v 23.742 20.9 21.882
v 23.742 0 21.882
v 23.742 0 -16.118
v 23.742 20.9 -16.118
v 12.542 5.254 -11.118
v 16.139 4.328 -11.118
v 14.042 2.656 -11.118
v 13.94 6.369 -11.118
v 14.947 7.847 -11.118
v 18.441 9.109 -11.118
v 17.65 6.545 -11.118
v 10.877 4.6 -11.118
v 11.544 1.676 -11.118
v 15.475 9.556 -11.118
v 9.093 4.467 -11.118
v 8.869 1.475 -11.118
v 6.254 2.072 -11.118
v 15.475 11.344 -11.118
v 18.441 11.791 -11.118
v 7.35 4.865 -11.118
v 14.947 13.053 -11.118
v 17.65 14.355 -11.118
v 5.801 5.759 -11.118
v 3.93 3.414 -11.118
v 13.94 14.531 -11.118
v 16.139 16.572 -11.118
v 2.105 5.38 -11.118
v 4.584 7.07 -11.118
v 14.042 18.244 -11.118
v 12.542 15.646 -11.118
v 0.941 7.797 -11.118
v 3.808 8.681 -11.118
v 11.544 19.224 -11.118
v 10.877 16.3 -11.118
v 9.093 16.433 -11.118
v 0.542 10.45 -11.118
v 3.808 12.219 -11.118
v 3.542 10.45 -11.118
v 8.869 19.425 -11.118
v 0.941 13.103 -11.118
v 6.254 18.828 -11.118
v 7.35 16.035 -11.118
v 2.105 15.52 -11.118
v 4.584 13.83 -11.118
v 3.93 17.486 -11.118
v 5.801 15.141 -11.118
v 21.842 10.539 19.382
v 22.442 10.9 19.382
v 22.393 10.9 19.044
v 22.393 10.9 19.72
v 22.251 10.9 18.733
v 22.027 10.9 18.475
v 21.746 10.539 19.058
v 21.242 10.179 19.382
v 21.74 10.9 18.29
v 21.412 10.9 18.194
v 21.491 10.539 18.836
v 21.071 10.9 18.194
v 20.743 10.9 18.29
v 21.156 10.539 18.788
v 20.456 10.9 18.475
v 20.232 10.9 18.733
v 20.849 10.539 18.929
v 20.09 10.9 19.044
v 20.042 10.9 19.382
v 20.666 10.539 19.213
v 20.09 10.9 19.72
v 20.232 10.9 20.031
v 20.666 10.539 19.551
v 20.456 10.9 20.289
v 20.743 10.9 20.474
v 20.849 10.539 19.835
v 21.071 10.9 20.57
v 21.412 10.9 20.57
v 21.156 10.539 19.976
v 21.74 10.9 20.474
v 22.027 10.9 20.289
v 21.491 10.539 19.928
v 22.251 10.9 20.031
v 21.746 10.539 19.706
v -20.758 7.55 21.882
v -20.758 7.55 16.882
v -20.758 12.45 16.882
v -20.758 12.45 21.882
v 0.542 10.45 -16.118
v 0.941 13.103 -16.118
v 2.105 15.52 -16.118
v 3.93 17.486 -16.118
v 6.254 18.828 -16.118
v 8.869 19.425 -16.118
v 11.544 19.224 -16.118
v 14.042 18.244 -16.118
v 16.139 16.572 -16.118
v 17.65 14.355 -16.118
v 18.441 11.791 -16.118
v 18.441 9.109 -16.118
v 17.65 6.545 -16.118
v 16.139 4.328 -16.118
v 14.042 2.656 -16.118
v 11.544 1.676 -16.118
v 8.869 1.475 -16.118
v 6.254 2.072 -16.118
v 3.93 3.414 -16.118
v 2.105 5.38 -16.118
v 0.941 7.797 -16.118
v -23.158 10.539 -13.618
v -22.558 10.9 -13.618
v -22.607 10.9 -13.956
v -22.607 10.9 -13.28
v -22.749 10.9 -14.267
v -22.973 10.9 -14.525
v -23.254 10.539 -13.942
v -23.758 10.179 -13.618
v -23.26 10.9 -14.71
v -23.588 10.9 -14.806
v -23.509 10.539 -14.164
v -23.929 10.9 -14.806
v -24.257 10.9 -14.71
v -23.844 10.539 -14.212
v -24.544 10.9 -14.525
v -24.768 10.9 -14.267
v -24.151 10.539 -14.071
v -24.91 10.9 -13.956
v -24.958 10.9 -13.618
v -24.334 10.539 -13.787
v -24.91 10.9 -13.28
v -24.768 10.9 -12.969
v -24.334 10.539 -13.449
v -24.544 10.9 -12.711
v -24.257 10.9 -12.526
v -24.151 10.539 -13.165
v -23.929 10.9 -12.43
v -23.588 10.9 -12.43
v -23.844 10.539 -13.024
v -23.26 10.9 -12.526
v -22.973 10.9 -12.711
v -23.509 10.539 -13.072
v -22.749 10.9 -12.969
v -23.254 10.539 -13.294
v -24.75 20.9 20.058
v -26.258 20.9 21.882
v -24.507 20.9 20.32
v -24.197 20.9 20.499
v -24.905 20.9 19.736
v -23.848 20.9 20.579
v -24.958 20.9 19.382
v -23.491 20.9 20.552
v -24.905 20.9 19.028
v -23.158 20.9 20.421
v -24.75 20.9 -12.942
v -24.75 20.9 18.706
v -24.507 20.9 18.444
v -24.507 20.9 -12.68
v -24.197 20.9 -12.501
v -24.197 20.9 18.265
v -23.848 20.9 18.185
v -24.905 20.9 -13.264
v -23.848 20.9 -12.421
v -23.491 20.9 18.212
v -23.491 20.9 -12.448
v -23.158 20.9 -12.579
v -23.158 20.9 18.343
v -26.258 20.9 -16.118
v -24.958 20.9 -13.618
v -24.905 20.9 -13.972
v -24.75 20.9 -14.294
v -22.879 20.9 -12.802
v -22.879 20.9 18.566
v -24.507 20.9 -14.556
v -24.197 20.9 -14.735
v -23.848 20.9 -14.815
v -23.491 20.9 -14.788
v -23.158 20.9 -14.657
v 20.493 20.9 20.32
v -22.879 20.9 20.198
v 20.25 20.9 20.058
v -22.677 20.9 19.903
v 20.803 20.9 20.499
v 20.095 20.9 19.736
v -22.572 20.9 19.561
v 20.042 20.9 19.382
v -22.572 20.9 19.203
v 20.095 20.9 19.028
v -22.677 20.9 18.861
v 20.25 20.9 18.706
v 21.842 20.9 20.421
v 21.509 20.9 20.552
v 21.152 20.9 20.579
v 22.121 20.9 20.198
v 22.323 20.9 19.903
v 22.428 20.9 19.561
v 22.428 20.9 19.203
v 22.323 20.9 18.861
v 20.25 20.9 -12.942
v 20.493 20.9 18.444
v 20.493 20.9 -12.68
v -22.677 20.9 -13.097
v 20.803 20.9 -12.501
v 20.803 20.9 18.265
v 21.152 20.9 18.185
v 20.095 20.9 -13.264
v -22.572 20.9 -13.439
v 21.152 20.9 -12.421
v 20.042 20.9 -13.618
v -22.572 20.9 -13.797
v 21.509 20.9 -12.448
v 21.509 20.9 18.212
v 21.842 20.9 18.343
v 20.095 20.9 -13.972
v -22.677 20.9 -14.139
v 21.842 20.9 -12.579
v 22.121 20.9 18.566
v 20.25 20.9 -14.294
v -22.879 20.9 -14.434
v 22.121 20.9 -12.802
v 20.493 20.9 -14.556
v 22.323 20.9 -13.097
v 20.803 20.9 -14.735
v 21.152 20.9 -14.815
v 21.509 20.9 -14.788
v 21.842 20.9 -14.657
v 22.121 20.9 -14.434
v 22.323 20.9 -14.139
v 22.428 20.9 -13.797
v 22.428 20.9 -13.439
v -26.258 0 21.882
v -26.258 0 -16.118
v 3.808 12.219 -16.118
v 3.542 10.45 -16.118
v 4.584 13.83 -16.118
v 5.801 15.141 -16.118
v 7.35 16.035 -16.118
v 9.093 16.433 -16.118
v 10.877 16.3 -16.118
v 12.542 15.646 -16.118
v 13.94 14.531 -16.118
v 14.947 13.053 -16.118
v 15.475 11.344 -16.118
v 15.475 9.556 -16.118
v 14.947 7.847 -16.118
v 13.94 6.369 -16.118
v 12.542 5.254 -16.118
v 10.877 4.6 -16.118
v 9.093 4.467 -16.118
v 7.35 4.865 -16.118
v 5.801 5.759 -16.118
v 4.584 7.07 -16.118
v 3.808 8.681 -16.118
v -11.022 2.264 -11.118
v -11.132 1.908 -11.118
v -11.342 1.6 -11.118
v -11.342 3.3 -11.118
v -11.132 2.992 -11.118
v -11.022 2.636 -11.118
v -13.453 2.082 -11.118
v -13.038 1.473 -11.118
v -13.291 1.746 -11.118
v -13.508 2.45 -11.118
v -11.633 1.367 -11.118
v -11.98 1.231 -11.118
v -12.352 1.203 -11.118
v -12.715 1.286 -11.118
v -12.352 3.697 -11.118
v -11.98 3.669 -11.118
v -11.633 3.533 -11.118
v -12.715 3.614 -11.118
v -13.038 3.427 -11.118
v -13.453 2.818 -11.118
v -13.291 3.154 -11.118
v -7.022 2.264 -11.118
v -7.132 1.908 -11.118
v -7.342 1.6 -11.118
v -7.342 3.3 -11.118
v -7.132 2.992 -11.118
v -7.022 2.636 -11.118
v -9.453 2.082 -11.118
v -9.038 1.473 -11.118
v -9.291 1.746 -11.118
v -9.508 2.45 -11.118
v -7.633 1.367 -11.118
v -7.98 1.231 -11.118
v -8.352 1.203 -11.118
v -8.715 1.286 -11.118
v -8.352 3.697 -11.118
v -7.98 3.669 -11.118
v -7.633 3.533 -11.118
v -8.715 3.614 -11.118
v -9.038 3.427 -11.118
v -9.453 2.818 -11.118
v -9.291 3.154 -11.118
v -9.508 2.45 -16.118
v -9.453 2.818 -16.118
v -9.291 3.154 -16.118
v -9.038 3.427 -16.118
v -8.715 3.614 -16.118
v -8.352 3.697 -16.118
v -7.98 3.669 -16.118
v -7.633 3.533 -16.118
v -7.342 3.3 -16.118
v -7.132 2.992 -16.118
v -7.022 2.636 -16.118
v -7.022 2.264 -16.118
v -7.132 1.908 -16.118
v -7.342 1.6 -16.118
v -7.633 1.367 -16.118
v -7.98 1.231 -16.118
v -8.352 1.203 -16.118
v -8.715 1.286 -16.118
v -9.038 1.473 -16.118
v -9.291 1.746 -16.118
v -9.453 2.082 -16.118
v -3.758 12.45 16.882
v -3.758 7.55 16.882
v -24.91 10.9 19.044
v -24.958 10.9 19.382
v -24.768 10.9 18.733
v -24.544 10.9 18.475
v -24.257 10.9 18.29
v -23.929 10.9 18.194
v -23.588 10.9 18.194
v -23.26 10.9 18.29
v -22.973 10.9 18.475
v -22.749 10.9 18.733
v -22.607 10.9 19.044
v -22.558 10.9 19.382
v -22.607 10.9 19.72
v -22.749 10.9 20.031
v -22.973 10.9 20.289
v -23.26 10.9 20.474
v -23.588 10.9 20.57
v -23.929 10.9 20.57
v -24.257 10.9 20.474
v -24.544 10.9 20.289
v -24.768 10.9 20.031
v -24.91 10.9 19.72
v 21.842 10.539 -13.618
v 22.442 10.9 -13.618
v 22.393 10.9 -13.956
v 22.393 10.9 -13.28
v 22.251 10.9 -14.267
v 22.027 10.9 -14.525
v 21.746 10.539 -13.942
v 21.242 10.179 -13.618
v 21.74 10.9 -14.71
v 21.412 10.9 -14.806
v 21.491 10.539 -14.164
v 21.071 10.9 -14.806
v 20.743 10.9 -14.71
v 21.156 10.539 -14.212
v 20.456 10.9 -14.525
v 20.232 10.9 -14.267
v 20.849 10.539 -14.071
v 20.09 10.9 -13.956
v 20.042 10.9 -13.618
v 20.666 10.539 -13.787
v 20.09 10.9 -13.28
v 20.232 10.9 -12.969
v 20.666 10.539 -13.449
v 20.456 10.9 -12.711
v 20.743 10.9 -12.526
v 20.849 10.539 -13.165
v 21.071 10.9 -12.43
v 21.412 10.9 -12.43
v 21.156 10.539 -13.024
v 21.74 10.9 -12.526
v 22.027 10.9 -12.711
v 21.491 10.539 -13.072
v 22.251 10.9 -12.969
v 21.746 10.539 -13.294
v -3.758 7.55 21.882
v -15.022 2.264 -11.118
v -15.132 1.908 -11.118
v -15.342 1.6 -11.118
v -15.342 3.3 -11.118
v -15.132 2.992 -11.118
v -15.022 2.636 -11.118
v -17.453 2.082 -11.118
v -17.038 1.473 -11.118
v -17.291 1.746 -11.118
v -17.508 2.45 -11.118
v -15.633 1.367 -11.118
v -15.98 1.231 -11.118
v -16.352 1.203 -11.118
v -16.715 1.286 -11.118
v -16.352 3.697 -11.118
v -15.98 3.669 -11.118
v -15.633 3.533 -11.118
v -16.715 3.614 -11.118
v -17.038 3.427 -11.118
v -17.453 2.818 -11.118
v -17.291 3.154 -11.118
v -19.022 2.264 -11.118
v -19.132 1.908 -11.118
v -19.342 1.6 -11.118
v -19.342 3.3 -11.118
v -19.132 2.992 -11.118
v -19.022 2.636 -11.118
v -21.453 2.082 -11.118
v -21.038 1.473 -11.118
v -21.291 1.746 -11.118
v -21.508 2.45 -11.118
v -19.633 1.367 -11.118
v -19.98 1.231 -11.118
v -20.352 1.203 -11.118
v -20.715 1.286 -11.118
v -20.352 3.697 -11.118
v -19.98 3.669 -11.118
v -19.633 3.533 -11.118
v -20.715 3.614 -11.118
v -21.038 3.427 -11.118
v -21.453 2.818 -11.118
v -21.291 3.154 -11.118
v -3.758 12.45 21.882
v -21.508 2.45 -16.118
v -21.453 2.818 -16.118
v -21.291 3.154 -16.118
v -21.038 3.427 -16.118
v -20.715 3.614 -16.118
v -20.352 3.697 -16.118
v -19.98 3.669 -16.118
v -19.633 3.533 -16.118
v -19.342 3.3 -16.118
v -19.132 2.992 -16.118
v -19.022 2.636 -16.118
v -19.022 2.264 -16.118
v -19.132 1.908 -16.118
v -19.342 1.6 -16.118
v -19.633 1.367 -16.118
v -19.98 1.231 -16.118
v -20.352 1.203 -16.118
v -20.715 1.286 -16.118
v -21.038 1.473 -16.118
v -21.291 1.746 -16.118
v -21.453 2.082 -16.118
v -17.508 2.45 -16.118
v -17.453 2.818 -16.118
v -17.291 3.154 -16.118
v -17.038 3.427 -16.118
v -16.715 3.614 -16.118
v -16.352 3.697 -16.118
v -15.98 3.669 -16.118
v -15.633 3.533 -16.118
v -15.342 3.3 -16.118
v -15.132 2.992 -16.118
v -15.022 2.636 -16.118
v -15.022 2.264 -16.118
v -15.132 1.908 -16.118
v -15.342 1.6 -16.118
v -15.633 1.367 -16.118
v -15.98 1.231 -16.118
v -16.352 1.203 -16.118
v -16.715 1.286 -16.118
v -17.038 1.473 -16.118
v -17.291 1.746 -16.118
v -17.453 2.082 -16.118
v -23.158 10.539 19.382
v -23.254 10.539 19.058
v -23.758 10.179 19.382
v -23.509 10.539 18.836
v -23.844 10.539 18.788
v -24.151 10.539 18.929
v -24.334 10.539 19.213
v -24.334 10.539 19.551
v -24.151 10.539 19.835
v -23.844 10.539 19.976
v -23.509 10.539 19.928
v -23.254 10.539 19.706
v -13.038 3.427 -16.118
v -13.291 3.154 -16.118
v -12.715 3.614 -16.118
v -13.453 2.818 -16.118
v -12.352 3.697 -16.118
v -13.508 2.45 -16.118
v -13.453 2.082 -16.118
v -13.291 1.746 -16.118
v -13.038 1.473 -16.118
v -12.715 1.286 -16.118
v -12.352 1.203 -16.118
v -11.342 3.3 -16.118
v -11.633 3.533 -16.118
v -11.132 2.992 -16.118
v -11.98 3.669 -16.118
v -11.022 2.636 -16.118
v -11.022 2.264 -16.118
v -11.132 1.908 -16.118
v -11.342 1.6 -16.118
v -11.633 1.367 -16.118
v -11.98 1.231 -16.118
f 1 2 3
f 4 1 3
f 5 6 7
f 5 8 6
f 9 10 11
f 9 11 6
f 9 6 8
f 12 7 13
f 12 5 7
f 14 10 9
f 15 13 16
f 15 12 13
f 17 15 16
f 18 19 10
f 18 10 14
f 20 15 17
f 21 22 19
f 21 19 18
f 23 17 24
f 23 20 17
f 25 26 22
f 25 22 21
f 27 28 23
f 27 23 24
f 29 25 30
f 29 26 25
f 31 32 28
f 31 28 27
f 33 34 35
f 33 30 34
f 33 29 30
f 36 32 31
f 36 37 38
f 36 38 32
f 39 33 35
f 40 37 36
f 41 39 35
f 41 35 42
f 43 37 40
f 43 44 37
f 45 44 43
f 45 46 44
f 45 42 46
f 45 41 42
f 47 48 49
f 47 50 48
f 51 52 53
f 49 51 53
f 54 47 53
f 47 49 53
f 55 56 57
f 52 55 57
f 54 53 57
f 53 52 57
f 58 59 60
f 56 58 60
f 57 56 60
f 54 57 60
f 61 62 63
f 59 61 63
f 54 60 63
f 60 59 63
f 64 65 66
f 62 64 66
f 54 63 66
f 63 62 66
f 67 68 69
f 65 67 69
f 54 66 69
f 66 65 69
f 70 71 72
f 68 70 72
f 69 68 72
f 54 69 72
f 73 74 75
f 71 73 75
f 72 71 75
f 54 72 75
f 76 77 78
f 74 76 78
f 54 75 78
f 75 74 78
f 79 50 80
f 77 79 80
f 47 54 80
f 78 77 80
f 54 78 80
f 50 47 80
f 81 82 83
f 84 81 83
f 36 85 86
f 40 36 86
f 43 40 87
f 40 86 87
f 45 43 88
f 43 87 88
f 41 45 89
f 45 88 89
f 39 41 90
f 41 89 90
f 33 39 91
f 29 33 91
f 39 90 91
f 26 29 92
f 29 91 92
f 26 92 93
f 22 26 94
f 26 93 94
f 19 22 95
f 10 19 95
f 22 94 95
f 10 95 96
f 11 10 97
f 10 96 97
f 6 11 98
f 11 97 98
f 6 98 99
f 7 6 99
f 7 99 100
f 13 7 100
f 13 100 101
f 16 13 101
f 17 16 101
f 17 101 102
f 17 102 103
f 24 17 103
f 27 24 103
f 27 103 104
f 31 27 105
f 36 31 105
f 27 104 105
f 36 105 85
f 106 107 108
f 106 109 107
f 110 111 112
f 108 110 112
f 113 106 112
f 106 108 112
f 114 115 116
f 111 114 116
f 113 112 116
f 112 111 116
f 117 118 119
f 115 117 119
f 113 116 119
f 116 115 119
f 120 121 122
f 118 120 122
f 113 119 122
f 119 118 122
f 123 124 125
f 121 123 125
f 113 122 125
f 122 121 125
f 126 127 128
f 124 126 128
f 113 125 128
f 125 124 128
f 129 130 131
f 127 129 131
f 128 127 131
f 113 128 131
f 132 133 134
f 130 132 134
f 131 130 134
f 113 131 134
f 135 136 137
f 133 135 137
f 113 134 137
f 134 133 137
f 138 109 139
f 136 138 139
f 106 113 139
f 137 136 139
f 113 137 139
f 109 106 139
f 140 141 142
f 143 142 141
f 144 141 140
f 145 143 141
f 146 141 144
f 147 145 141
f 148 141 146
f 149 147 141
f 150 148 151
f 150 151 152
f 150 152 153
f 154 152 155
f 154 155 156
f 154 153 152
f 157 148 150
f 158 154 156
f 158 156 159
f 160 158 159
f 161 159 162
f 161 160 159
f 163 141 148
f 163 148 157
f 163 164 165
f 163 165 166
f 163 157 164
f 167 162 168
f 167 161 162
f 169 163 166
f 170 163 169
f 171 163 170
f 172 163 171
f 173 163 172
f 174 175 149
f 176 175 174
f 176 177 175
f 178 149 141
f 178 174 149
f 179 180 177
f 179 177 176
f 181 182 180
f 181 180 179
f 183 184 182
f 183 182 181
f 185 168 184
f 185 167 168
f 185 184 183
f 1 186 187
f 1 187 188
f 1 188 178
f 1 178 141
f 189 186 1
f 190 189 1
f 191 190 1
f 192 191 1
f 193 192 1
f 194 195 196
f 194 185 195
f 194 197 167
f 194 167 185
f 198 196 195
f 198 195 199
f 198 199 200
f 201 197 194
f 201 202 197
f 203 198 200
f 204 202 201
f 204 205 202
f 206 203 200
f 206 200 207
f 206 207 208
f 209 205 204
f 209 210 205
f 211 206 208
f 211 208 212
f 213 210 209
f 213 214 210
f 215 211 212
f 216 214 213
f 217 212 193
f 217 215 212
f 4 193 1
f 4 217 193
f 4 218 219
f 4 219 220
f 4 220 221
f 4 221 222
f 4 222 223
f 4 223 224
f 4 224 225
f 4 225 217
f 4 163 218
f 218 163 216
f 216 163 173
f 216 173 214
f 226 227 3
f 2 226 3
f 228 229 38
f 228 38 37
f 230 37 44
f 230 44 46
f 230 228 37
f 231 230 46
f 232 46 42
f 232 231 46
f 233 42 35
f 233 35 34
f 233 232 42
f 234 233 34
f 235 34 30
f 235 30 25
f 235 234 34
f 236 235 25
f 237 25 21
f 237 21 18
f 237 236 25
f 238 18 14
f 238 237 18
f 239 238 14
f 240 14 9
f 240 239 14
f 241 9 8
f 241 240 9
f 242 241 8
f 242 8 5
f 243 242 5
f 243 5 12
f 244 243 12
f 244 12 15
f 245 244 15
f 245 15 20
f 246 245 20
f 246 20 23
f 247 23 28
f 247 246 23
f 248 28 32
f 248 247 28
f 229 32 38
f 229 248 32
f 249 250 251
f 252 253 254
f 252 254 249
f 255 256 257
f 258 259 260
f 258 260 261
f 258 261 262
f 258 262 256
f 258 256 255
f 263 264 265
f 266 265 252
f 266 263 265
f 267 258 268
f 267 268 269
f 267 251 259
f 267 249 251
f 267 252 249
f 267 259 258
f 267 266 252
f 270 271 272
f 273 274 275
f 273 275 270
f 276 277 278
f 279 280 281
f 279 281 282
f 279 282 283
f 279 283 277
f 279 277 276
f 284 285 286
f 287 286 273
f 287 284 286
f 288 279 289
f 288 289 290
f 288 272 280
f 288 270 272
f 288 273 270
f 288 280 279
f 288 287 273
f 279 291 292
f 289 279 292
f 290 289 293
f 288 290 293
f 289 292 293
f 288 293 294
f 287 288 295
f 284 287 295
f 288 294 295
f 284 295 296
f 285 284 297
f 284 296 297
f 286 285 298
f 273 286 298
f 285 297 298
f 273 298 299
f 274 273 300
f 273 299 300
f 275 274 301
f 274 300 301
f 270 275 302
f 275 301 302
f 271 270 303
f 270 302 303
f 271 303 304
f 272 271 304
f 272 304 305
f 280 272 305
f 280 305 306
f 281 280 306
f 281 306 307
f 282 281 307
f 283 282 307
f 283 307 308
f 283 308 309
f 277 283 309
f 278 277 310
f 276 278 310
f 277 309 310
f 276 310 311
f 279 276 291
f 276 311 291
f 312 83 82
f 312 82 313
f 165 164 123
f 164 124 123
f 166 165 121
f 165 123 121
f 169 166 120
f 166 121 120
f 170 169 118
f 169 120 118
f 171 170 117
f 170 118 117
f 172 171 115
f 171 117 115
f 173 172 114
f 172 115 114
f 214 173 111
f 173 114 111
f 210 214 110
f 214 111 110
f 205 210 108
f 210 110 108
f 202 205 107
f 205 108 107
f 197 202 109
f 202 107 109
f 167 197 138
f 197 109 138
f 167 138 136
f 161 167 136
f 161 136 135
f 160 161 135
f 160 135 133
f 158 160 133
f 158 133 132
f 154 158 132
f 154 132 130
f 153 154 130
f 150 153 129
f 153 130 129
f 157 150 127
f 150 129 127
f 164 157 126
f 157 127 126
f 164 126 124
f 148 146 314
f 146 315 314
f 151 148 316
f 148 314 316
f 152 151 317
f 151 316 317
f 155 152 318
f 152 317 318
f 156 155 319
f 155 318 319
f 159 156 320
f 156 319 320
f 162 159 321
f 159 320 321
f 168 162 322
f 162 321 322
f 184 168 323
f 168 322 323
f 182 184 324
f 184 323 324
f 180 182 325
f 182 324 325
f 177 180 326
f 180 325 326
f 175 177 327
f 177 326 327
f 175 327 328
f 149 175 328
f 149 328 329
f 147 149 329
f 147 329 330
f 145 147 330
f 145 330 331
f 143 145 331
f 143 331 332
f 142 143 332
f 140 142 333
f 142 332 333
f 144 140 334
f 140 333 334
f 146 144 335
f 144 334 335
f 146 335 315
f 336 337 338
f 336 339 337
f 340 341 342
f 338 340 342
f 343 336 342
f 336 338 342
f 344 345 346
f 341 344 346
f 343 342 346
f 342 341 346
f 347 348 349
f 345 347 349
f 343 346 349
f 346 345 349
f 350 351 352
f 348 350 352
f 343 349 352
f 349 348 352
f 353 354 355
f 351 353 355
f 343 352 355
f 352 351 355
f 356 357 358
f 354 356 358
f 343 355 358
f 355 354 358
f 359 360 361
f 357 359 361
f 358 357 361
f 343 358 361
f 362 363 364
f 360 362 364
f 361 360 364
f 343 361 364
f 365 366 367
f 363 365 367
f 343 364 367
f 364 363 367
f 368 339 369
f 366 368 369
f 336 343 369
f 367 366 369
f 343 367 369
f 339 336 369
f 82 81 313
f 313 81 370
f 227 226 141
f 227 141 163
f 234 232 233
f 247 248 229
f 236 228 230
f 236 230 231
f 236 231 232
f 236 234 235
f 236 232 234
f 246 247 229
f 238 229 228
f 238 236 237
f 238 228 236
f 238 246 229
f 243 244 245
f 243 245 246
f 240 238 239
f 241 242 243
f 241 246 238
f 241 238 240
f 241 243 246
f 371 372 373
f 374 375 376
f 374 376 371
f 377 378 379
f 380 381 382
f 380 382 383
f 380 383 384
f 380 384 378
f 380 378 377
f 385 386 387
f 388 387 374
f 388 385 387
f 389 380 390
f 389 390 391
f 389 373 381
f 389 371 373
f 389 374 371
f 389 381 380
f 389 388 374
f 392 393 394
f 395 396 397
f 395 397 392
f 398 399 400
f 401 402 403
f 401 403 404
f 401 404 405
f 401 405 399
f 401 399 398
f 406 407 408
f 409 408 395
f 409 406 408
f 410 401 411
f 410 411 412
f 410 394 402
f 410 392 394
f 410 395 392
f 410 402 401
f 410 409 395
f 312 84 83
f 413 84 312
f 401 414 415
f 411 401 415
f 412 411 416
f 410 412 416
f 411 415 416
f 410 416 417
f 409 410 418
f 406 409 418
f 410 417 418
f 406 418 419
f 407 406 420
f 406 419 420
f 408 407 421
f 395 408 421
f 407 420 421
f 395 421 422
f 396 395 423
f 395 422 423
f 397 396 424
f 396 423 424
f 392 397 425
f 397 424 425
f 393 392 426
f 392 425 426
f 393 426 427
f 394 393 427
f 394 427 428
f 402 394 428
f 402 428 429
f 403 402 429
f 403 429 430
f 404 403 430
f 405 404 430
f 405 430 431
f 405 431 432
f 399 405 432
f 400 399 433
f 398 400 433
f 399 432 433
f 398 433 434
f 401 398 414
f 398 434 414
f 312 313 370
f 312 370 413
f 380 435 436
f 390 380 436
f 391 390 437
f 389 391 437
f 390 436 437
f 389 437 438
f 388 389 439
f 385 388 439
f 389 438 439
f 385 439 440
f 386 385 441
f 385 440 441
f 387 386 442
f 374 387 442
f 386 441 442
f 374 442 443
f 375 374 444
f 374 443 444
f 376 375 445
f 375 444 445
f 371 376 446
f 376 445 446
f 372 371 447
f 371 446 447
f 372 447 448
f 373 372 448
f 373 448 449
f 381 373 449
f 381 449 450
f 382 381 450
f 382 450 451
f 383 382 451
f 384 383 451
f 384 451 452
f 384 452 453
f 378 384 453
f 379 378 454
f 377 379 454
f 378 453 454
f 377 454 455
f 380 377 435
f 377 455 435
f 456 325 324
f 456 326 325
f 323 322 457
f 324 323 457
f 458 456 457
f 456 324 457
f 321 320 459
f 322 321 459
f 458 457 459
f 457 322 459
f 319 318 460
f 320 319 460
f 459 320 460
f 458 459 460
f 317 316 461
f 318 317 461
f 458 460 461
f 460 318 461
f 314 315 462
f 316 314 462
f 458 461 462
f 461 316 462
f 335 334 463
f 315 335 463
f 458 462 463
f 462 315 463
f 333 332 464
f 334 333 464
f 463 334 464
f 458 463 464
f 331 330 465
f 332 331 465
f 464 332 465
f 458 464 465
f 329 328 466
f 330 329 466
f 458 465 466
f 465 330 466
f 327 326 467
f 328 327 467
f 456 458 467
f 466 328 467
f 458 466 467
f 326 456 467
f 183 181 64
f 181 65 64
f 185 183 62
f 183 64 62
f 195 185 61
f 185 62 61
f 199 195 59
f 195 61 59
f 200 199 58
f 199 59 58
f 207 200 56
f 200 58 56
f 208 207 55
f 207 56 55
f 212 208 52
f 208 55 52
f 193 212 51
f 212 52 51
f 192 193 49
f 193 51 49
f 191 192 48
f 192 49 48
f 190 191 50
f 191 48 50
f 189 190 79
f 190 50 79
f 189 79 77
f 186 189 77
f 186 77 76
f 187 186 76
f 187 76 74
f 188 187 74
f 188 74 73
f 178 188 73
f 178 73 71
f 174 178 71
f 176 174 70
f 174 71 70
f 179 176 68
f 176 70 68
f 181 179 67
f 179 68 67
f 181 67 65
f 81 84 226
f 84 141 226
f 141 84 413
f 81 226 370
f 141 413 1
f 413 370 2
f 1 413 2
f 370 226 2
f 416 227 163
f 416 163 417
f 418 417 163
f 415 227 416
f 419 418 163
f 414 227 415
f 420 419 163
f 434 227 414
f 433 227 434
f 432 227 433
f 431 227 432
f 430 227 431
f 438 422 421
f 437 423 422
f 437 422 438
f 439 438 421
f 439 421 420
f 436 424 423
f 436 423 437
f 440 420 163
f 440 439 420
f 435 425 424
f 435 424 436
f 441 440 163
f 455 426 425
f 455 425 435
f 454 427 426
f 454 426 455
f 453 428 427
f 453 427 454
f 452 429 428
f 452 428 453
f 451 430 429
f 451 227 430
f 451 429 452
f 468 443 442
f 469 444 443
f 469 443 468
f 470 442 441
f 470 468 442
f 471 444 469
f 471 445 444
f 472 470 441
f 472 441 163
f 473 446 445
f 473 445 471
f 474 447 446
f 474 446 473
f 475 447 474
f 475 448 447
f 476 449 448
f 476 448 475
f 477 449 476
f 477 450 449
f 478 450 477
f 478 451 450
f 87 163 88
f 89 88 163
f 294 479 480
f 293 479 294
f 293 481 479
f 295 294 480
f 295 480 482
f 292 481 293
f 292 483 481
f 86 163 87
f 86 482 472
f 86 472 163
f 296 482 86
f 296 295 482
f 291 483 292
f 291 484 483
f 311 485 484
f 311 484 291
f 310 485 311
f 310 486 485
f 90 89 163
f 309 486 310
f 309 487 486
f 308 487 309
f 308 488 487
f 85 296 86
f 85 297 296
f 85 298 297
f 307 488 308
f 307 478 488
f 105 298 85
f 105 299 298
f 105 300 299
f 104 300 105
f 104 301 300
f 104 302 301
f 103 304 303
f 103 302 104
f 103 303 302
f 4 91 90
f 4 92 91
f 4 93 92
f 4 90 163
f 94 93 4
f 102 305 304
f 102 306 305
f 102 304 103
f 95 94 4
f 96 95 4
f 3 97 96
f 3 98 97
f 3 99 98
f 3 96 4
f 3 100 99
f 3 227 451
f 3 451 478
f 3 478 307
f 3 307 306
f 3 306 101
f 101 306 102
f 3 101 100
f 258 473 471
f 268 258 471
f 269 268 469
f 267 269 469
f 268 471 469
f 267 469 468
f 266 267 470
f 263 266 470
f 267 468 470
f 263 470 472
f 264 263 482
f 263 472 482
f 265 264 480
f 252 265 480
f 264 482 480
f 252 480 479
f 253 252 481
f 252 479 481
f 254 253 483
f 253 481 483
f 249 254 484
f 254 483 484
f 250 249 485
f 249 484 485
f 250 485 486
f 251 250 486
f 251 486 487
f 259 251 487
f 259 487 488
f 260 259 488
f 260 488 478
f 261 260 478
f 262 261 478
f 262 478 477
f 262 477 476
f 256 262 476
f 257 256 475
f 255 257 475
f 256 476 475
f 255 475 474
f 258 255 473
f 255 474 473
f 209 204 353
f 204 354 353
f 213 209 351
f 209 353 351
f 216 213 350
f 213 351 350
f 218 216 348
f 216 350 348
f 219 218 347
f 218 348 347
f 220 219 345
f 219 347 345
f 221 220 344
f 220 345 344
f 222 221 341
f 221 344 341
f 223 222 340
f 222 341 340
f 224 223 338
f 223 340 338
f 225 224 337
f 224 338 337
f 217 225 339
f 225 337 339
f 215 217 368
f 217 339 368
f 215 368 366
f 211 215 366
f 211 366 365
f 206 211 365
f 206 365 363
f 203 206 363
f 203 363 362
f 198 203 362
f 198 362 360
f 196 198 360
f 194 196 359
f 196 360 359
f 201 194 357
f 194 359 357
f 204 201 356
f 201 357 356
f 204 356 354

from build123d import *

# Parameters (mm, degrees)
SKETCH1_W                = 50
SKETCH1_H                = 38
BOSS_EXTRUDE1_DEPTH      = 20.9
M2_CLEARANCE_HOLE1_D     = 2.4
M2_CLEARANCE_HOLE1_DEPTH = 10
M2_CLEARANCE_HOLE1_TIP   = 0.721032743
SKETCH5_R                = 9
SKETCH5_R_2              = 6
SKETCH5_R_3              = 1.25
CUT_EXTRUDE1_DEPTH       = 5
SKETCH6_W                = 17
SKETCH6_H                = 4.9
CUT_EXTRUDE2_DEPTH       = 5


with BuildPart() as part:
    # Sketch1 → Boss-Extrude1 (new body)
    with BuildSketch(Plane(origin=(0, 0, 0), x_dir=(1, 0, 0), z_dir=(0, 1, 0))):
        with Locations((-1.258426966, -2.882022472)):
            Rectangle(SKETCH1_W, SKETCH1_H)
    extrude(amount=BOSS_EXTRUDE1_DEPTH)

    # M2 Clearance Hole1
    with Locations(Plane(origin=(0, 20.9, 0), x_dir=(1, 0, 0), z_dir=(0, 1, 0))):
        with Locations((-23.758426966, 13.617977528), (-23.758426966, -19.382022472), (21.241573034, -19.382022472), (21.241573034, 13.617977528)):
            Hole(M2_CLEARANCE_HOLE1_D / 2, depth=M2_CLEARANCE_HOLE1_DEPTH)
            with Locations((0, 0, -(M2_CLEARANCE_HOLE1_DEPTH + M2_CLEARANCE_HOLE1_TIP / 2))):  # 118° drill point
                Cone(0, M2_CLEARANCE_HOLE1_D / 2, M2_CLEARANCE_HOLE1_TIP, mode=Mode.SUBTRACT)

    # Sketch5 → Cut-Extrude1 (cut)
    # profile 1 of 5: a face of its own
    with BuildSketch(Plane(origin=(0, 0, -16.117977528), x_dir=(-1, 0, 0), z_dir=(0, 0, -1))):
        with Locations((-9.541573034, 10.45)):
            Circle(SKETCH5_R)
        with Locations((-9.541573034, 10.45)):
            Circle(SKETCH5_R_2, mode=Mode.SUBTRACT)
    # profile 2 of 5: a face of its own
    with BuildSketch(Plane(origin=(0, 0, -16.117977528), x_dir=(-1, 0, 0), z_dir=(0, 0, -1))):
        with Locations((20.258426966, 2.45)):
            Circle(SKETCH5_R_3)
    # profile 3 of 5: a face of its own
    with BuildSketch(Plane(origin=(0, 0, -16.117977528), x_dir=(-1, 0, 0), z_dir=(0, 0, -1))):
        with Locations((16.258426966, 2.45)):
            Circle(SKETCH5_R_3)
    # profile 4 of 5: a face of its own
    with BuildSketch(Plane(origin=(0, 0, -16.117977528), x_dir=(-1, 0, 0), z_dir=(0, 0, -1))):
        with Locations((12.258426966, 2.45)):
            Circle(SKETCH5_R_3)
    # profile 5 of 5: a face of its own
    with BuildSketch(Plane(origin=(0, 0, -16.117977528), x_dir=(-1, 0, 0), z_dir=(0, 0, -1))):
        with Locations((8.258426966, 2.45)):
            Circle(SKETCH5_R_3)
    extrude(amount=-CUT_EXTRUDE1_DEPTH, mode=Mode.SUBTRACT)

    # Sketch6 → Cut-Extrude2 (cut)
    with BuildSketch(Plane.XY.offset(21.882022472)):
        with Locations((-12.258426966, 10)):
            Rectangle(SKETCH6_W, SKETCH6_H)
    extrude(amount=-CUT_EXTRUDE2_DEPTH, mode=Mode.SUBTRACT)


solid = part.part
